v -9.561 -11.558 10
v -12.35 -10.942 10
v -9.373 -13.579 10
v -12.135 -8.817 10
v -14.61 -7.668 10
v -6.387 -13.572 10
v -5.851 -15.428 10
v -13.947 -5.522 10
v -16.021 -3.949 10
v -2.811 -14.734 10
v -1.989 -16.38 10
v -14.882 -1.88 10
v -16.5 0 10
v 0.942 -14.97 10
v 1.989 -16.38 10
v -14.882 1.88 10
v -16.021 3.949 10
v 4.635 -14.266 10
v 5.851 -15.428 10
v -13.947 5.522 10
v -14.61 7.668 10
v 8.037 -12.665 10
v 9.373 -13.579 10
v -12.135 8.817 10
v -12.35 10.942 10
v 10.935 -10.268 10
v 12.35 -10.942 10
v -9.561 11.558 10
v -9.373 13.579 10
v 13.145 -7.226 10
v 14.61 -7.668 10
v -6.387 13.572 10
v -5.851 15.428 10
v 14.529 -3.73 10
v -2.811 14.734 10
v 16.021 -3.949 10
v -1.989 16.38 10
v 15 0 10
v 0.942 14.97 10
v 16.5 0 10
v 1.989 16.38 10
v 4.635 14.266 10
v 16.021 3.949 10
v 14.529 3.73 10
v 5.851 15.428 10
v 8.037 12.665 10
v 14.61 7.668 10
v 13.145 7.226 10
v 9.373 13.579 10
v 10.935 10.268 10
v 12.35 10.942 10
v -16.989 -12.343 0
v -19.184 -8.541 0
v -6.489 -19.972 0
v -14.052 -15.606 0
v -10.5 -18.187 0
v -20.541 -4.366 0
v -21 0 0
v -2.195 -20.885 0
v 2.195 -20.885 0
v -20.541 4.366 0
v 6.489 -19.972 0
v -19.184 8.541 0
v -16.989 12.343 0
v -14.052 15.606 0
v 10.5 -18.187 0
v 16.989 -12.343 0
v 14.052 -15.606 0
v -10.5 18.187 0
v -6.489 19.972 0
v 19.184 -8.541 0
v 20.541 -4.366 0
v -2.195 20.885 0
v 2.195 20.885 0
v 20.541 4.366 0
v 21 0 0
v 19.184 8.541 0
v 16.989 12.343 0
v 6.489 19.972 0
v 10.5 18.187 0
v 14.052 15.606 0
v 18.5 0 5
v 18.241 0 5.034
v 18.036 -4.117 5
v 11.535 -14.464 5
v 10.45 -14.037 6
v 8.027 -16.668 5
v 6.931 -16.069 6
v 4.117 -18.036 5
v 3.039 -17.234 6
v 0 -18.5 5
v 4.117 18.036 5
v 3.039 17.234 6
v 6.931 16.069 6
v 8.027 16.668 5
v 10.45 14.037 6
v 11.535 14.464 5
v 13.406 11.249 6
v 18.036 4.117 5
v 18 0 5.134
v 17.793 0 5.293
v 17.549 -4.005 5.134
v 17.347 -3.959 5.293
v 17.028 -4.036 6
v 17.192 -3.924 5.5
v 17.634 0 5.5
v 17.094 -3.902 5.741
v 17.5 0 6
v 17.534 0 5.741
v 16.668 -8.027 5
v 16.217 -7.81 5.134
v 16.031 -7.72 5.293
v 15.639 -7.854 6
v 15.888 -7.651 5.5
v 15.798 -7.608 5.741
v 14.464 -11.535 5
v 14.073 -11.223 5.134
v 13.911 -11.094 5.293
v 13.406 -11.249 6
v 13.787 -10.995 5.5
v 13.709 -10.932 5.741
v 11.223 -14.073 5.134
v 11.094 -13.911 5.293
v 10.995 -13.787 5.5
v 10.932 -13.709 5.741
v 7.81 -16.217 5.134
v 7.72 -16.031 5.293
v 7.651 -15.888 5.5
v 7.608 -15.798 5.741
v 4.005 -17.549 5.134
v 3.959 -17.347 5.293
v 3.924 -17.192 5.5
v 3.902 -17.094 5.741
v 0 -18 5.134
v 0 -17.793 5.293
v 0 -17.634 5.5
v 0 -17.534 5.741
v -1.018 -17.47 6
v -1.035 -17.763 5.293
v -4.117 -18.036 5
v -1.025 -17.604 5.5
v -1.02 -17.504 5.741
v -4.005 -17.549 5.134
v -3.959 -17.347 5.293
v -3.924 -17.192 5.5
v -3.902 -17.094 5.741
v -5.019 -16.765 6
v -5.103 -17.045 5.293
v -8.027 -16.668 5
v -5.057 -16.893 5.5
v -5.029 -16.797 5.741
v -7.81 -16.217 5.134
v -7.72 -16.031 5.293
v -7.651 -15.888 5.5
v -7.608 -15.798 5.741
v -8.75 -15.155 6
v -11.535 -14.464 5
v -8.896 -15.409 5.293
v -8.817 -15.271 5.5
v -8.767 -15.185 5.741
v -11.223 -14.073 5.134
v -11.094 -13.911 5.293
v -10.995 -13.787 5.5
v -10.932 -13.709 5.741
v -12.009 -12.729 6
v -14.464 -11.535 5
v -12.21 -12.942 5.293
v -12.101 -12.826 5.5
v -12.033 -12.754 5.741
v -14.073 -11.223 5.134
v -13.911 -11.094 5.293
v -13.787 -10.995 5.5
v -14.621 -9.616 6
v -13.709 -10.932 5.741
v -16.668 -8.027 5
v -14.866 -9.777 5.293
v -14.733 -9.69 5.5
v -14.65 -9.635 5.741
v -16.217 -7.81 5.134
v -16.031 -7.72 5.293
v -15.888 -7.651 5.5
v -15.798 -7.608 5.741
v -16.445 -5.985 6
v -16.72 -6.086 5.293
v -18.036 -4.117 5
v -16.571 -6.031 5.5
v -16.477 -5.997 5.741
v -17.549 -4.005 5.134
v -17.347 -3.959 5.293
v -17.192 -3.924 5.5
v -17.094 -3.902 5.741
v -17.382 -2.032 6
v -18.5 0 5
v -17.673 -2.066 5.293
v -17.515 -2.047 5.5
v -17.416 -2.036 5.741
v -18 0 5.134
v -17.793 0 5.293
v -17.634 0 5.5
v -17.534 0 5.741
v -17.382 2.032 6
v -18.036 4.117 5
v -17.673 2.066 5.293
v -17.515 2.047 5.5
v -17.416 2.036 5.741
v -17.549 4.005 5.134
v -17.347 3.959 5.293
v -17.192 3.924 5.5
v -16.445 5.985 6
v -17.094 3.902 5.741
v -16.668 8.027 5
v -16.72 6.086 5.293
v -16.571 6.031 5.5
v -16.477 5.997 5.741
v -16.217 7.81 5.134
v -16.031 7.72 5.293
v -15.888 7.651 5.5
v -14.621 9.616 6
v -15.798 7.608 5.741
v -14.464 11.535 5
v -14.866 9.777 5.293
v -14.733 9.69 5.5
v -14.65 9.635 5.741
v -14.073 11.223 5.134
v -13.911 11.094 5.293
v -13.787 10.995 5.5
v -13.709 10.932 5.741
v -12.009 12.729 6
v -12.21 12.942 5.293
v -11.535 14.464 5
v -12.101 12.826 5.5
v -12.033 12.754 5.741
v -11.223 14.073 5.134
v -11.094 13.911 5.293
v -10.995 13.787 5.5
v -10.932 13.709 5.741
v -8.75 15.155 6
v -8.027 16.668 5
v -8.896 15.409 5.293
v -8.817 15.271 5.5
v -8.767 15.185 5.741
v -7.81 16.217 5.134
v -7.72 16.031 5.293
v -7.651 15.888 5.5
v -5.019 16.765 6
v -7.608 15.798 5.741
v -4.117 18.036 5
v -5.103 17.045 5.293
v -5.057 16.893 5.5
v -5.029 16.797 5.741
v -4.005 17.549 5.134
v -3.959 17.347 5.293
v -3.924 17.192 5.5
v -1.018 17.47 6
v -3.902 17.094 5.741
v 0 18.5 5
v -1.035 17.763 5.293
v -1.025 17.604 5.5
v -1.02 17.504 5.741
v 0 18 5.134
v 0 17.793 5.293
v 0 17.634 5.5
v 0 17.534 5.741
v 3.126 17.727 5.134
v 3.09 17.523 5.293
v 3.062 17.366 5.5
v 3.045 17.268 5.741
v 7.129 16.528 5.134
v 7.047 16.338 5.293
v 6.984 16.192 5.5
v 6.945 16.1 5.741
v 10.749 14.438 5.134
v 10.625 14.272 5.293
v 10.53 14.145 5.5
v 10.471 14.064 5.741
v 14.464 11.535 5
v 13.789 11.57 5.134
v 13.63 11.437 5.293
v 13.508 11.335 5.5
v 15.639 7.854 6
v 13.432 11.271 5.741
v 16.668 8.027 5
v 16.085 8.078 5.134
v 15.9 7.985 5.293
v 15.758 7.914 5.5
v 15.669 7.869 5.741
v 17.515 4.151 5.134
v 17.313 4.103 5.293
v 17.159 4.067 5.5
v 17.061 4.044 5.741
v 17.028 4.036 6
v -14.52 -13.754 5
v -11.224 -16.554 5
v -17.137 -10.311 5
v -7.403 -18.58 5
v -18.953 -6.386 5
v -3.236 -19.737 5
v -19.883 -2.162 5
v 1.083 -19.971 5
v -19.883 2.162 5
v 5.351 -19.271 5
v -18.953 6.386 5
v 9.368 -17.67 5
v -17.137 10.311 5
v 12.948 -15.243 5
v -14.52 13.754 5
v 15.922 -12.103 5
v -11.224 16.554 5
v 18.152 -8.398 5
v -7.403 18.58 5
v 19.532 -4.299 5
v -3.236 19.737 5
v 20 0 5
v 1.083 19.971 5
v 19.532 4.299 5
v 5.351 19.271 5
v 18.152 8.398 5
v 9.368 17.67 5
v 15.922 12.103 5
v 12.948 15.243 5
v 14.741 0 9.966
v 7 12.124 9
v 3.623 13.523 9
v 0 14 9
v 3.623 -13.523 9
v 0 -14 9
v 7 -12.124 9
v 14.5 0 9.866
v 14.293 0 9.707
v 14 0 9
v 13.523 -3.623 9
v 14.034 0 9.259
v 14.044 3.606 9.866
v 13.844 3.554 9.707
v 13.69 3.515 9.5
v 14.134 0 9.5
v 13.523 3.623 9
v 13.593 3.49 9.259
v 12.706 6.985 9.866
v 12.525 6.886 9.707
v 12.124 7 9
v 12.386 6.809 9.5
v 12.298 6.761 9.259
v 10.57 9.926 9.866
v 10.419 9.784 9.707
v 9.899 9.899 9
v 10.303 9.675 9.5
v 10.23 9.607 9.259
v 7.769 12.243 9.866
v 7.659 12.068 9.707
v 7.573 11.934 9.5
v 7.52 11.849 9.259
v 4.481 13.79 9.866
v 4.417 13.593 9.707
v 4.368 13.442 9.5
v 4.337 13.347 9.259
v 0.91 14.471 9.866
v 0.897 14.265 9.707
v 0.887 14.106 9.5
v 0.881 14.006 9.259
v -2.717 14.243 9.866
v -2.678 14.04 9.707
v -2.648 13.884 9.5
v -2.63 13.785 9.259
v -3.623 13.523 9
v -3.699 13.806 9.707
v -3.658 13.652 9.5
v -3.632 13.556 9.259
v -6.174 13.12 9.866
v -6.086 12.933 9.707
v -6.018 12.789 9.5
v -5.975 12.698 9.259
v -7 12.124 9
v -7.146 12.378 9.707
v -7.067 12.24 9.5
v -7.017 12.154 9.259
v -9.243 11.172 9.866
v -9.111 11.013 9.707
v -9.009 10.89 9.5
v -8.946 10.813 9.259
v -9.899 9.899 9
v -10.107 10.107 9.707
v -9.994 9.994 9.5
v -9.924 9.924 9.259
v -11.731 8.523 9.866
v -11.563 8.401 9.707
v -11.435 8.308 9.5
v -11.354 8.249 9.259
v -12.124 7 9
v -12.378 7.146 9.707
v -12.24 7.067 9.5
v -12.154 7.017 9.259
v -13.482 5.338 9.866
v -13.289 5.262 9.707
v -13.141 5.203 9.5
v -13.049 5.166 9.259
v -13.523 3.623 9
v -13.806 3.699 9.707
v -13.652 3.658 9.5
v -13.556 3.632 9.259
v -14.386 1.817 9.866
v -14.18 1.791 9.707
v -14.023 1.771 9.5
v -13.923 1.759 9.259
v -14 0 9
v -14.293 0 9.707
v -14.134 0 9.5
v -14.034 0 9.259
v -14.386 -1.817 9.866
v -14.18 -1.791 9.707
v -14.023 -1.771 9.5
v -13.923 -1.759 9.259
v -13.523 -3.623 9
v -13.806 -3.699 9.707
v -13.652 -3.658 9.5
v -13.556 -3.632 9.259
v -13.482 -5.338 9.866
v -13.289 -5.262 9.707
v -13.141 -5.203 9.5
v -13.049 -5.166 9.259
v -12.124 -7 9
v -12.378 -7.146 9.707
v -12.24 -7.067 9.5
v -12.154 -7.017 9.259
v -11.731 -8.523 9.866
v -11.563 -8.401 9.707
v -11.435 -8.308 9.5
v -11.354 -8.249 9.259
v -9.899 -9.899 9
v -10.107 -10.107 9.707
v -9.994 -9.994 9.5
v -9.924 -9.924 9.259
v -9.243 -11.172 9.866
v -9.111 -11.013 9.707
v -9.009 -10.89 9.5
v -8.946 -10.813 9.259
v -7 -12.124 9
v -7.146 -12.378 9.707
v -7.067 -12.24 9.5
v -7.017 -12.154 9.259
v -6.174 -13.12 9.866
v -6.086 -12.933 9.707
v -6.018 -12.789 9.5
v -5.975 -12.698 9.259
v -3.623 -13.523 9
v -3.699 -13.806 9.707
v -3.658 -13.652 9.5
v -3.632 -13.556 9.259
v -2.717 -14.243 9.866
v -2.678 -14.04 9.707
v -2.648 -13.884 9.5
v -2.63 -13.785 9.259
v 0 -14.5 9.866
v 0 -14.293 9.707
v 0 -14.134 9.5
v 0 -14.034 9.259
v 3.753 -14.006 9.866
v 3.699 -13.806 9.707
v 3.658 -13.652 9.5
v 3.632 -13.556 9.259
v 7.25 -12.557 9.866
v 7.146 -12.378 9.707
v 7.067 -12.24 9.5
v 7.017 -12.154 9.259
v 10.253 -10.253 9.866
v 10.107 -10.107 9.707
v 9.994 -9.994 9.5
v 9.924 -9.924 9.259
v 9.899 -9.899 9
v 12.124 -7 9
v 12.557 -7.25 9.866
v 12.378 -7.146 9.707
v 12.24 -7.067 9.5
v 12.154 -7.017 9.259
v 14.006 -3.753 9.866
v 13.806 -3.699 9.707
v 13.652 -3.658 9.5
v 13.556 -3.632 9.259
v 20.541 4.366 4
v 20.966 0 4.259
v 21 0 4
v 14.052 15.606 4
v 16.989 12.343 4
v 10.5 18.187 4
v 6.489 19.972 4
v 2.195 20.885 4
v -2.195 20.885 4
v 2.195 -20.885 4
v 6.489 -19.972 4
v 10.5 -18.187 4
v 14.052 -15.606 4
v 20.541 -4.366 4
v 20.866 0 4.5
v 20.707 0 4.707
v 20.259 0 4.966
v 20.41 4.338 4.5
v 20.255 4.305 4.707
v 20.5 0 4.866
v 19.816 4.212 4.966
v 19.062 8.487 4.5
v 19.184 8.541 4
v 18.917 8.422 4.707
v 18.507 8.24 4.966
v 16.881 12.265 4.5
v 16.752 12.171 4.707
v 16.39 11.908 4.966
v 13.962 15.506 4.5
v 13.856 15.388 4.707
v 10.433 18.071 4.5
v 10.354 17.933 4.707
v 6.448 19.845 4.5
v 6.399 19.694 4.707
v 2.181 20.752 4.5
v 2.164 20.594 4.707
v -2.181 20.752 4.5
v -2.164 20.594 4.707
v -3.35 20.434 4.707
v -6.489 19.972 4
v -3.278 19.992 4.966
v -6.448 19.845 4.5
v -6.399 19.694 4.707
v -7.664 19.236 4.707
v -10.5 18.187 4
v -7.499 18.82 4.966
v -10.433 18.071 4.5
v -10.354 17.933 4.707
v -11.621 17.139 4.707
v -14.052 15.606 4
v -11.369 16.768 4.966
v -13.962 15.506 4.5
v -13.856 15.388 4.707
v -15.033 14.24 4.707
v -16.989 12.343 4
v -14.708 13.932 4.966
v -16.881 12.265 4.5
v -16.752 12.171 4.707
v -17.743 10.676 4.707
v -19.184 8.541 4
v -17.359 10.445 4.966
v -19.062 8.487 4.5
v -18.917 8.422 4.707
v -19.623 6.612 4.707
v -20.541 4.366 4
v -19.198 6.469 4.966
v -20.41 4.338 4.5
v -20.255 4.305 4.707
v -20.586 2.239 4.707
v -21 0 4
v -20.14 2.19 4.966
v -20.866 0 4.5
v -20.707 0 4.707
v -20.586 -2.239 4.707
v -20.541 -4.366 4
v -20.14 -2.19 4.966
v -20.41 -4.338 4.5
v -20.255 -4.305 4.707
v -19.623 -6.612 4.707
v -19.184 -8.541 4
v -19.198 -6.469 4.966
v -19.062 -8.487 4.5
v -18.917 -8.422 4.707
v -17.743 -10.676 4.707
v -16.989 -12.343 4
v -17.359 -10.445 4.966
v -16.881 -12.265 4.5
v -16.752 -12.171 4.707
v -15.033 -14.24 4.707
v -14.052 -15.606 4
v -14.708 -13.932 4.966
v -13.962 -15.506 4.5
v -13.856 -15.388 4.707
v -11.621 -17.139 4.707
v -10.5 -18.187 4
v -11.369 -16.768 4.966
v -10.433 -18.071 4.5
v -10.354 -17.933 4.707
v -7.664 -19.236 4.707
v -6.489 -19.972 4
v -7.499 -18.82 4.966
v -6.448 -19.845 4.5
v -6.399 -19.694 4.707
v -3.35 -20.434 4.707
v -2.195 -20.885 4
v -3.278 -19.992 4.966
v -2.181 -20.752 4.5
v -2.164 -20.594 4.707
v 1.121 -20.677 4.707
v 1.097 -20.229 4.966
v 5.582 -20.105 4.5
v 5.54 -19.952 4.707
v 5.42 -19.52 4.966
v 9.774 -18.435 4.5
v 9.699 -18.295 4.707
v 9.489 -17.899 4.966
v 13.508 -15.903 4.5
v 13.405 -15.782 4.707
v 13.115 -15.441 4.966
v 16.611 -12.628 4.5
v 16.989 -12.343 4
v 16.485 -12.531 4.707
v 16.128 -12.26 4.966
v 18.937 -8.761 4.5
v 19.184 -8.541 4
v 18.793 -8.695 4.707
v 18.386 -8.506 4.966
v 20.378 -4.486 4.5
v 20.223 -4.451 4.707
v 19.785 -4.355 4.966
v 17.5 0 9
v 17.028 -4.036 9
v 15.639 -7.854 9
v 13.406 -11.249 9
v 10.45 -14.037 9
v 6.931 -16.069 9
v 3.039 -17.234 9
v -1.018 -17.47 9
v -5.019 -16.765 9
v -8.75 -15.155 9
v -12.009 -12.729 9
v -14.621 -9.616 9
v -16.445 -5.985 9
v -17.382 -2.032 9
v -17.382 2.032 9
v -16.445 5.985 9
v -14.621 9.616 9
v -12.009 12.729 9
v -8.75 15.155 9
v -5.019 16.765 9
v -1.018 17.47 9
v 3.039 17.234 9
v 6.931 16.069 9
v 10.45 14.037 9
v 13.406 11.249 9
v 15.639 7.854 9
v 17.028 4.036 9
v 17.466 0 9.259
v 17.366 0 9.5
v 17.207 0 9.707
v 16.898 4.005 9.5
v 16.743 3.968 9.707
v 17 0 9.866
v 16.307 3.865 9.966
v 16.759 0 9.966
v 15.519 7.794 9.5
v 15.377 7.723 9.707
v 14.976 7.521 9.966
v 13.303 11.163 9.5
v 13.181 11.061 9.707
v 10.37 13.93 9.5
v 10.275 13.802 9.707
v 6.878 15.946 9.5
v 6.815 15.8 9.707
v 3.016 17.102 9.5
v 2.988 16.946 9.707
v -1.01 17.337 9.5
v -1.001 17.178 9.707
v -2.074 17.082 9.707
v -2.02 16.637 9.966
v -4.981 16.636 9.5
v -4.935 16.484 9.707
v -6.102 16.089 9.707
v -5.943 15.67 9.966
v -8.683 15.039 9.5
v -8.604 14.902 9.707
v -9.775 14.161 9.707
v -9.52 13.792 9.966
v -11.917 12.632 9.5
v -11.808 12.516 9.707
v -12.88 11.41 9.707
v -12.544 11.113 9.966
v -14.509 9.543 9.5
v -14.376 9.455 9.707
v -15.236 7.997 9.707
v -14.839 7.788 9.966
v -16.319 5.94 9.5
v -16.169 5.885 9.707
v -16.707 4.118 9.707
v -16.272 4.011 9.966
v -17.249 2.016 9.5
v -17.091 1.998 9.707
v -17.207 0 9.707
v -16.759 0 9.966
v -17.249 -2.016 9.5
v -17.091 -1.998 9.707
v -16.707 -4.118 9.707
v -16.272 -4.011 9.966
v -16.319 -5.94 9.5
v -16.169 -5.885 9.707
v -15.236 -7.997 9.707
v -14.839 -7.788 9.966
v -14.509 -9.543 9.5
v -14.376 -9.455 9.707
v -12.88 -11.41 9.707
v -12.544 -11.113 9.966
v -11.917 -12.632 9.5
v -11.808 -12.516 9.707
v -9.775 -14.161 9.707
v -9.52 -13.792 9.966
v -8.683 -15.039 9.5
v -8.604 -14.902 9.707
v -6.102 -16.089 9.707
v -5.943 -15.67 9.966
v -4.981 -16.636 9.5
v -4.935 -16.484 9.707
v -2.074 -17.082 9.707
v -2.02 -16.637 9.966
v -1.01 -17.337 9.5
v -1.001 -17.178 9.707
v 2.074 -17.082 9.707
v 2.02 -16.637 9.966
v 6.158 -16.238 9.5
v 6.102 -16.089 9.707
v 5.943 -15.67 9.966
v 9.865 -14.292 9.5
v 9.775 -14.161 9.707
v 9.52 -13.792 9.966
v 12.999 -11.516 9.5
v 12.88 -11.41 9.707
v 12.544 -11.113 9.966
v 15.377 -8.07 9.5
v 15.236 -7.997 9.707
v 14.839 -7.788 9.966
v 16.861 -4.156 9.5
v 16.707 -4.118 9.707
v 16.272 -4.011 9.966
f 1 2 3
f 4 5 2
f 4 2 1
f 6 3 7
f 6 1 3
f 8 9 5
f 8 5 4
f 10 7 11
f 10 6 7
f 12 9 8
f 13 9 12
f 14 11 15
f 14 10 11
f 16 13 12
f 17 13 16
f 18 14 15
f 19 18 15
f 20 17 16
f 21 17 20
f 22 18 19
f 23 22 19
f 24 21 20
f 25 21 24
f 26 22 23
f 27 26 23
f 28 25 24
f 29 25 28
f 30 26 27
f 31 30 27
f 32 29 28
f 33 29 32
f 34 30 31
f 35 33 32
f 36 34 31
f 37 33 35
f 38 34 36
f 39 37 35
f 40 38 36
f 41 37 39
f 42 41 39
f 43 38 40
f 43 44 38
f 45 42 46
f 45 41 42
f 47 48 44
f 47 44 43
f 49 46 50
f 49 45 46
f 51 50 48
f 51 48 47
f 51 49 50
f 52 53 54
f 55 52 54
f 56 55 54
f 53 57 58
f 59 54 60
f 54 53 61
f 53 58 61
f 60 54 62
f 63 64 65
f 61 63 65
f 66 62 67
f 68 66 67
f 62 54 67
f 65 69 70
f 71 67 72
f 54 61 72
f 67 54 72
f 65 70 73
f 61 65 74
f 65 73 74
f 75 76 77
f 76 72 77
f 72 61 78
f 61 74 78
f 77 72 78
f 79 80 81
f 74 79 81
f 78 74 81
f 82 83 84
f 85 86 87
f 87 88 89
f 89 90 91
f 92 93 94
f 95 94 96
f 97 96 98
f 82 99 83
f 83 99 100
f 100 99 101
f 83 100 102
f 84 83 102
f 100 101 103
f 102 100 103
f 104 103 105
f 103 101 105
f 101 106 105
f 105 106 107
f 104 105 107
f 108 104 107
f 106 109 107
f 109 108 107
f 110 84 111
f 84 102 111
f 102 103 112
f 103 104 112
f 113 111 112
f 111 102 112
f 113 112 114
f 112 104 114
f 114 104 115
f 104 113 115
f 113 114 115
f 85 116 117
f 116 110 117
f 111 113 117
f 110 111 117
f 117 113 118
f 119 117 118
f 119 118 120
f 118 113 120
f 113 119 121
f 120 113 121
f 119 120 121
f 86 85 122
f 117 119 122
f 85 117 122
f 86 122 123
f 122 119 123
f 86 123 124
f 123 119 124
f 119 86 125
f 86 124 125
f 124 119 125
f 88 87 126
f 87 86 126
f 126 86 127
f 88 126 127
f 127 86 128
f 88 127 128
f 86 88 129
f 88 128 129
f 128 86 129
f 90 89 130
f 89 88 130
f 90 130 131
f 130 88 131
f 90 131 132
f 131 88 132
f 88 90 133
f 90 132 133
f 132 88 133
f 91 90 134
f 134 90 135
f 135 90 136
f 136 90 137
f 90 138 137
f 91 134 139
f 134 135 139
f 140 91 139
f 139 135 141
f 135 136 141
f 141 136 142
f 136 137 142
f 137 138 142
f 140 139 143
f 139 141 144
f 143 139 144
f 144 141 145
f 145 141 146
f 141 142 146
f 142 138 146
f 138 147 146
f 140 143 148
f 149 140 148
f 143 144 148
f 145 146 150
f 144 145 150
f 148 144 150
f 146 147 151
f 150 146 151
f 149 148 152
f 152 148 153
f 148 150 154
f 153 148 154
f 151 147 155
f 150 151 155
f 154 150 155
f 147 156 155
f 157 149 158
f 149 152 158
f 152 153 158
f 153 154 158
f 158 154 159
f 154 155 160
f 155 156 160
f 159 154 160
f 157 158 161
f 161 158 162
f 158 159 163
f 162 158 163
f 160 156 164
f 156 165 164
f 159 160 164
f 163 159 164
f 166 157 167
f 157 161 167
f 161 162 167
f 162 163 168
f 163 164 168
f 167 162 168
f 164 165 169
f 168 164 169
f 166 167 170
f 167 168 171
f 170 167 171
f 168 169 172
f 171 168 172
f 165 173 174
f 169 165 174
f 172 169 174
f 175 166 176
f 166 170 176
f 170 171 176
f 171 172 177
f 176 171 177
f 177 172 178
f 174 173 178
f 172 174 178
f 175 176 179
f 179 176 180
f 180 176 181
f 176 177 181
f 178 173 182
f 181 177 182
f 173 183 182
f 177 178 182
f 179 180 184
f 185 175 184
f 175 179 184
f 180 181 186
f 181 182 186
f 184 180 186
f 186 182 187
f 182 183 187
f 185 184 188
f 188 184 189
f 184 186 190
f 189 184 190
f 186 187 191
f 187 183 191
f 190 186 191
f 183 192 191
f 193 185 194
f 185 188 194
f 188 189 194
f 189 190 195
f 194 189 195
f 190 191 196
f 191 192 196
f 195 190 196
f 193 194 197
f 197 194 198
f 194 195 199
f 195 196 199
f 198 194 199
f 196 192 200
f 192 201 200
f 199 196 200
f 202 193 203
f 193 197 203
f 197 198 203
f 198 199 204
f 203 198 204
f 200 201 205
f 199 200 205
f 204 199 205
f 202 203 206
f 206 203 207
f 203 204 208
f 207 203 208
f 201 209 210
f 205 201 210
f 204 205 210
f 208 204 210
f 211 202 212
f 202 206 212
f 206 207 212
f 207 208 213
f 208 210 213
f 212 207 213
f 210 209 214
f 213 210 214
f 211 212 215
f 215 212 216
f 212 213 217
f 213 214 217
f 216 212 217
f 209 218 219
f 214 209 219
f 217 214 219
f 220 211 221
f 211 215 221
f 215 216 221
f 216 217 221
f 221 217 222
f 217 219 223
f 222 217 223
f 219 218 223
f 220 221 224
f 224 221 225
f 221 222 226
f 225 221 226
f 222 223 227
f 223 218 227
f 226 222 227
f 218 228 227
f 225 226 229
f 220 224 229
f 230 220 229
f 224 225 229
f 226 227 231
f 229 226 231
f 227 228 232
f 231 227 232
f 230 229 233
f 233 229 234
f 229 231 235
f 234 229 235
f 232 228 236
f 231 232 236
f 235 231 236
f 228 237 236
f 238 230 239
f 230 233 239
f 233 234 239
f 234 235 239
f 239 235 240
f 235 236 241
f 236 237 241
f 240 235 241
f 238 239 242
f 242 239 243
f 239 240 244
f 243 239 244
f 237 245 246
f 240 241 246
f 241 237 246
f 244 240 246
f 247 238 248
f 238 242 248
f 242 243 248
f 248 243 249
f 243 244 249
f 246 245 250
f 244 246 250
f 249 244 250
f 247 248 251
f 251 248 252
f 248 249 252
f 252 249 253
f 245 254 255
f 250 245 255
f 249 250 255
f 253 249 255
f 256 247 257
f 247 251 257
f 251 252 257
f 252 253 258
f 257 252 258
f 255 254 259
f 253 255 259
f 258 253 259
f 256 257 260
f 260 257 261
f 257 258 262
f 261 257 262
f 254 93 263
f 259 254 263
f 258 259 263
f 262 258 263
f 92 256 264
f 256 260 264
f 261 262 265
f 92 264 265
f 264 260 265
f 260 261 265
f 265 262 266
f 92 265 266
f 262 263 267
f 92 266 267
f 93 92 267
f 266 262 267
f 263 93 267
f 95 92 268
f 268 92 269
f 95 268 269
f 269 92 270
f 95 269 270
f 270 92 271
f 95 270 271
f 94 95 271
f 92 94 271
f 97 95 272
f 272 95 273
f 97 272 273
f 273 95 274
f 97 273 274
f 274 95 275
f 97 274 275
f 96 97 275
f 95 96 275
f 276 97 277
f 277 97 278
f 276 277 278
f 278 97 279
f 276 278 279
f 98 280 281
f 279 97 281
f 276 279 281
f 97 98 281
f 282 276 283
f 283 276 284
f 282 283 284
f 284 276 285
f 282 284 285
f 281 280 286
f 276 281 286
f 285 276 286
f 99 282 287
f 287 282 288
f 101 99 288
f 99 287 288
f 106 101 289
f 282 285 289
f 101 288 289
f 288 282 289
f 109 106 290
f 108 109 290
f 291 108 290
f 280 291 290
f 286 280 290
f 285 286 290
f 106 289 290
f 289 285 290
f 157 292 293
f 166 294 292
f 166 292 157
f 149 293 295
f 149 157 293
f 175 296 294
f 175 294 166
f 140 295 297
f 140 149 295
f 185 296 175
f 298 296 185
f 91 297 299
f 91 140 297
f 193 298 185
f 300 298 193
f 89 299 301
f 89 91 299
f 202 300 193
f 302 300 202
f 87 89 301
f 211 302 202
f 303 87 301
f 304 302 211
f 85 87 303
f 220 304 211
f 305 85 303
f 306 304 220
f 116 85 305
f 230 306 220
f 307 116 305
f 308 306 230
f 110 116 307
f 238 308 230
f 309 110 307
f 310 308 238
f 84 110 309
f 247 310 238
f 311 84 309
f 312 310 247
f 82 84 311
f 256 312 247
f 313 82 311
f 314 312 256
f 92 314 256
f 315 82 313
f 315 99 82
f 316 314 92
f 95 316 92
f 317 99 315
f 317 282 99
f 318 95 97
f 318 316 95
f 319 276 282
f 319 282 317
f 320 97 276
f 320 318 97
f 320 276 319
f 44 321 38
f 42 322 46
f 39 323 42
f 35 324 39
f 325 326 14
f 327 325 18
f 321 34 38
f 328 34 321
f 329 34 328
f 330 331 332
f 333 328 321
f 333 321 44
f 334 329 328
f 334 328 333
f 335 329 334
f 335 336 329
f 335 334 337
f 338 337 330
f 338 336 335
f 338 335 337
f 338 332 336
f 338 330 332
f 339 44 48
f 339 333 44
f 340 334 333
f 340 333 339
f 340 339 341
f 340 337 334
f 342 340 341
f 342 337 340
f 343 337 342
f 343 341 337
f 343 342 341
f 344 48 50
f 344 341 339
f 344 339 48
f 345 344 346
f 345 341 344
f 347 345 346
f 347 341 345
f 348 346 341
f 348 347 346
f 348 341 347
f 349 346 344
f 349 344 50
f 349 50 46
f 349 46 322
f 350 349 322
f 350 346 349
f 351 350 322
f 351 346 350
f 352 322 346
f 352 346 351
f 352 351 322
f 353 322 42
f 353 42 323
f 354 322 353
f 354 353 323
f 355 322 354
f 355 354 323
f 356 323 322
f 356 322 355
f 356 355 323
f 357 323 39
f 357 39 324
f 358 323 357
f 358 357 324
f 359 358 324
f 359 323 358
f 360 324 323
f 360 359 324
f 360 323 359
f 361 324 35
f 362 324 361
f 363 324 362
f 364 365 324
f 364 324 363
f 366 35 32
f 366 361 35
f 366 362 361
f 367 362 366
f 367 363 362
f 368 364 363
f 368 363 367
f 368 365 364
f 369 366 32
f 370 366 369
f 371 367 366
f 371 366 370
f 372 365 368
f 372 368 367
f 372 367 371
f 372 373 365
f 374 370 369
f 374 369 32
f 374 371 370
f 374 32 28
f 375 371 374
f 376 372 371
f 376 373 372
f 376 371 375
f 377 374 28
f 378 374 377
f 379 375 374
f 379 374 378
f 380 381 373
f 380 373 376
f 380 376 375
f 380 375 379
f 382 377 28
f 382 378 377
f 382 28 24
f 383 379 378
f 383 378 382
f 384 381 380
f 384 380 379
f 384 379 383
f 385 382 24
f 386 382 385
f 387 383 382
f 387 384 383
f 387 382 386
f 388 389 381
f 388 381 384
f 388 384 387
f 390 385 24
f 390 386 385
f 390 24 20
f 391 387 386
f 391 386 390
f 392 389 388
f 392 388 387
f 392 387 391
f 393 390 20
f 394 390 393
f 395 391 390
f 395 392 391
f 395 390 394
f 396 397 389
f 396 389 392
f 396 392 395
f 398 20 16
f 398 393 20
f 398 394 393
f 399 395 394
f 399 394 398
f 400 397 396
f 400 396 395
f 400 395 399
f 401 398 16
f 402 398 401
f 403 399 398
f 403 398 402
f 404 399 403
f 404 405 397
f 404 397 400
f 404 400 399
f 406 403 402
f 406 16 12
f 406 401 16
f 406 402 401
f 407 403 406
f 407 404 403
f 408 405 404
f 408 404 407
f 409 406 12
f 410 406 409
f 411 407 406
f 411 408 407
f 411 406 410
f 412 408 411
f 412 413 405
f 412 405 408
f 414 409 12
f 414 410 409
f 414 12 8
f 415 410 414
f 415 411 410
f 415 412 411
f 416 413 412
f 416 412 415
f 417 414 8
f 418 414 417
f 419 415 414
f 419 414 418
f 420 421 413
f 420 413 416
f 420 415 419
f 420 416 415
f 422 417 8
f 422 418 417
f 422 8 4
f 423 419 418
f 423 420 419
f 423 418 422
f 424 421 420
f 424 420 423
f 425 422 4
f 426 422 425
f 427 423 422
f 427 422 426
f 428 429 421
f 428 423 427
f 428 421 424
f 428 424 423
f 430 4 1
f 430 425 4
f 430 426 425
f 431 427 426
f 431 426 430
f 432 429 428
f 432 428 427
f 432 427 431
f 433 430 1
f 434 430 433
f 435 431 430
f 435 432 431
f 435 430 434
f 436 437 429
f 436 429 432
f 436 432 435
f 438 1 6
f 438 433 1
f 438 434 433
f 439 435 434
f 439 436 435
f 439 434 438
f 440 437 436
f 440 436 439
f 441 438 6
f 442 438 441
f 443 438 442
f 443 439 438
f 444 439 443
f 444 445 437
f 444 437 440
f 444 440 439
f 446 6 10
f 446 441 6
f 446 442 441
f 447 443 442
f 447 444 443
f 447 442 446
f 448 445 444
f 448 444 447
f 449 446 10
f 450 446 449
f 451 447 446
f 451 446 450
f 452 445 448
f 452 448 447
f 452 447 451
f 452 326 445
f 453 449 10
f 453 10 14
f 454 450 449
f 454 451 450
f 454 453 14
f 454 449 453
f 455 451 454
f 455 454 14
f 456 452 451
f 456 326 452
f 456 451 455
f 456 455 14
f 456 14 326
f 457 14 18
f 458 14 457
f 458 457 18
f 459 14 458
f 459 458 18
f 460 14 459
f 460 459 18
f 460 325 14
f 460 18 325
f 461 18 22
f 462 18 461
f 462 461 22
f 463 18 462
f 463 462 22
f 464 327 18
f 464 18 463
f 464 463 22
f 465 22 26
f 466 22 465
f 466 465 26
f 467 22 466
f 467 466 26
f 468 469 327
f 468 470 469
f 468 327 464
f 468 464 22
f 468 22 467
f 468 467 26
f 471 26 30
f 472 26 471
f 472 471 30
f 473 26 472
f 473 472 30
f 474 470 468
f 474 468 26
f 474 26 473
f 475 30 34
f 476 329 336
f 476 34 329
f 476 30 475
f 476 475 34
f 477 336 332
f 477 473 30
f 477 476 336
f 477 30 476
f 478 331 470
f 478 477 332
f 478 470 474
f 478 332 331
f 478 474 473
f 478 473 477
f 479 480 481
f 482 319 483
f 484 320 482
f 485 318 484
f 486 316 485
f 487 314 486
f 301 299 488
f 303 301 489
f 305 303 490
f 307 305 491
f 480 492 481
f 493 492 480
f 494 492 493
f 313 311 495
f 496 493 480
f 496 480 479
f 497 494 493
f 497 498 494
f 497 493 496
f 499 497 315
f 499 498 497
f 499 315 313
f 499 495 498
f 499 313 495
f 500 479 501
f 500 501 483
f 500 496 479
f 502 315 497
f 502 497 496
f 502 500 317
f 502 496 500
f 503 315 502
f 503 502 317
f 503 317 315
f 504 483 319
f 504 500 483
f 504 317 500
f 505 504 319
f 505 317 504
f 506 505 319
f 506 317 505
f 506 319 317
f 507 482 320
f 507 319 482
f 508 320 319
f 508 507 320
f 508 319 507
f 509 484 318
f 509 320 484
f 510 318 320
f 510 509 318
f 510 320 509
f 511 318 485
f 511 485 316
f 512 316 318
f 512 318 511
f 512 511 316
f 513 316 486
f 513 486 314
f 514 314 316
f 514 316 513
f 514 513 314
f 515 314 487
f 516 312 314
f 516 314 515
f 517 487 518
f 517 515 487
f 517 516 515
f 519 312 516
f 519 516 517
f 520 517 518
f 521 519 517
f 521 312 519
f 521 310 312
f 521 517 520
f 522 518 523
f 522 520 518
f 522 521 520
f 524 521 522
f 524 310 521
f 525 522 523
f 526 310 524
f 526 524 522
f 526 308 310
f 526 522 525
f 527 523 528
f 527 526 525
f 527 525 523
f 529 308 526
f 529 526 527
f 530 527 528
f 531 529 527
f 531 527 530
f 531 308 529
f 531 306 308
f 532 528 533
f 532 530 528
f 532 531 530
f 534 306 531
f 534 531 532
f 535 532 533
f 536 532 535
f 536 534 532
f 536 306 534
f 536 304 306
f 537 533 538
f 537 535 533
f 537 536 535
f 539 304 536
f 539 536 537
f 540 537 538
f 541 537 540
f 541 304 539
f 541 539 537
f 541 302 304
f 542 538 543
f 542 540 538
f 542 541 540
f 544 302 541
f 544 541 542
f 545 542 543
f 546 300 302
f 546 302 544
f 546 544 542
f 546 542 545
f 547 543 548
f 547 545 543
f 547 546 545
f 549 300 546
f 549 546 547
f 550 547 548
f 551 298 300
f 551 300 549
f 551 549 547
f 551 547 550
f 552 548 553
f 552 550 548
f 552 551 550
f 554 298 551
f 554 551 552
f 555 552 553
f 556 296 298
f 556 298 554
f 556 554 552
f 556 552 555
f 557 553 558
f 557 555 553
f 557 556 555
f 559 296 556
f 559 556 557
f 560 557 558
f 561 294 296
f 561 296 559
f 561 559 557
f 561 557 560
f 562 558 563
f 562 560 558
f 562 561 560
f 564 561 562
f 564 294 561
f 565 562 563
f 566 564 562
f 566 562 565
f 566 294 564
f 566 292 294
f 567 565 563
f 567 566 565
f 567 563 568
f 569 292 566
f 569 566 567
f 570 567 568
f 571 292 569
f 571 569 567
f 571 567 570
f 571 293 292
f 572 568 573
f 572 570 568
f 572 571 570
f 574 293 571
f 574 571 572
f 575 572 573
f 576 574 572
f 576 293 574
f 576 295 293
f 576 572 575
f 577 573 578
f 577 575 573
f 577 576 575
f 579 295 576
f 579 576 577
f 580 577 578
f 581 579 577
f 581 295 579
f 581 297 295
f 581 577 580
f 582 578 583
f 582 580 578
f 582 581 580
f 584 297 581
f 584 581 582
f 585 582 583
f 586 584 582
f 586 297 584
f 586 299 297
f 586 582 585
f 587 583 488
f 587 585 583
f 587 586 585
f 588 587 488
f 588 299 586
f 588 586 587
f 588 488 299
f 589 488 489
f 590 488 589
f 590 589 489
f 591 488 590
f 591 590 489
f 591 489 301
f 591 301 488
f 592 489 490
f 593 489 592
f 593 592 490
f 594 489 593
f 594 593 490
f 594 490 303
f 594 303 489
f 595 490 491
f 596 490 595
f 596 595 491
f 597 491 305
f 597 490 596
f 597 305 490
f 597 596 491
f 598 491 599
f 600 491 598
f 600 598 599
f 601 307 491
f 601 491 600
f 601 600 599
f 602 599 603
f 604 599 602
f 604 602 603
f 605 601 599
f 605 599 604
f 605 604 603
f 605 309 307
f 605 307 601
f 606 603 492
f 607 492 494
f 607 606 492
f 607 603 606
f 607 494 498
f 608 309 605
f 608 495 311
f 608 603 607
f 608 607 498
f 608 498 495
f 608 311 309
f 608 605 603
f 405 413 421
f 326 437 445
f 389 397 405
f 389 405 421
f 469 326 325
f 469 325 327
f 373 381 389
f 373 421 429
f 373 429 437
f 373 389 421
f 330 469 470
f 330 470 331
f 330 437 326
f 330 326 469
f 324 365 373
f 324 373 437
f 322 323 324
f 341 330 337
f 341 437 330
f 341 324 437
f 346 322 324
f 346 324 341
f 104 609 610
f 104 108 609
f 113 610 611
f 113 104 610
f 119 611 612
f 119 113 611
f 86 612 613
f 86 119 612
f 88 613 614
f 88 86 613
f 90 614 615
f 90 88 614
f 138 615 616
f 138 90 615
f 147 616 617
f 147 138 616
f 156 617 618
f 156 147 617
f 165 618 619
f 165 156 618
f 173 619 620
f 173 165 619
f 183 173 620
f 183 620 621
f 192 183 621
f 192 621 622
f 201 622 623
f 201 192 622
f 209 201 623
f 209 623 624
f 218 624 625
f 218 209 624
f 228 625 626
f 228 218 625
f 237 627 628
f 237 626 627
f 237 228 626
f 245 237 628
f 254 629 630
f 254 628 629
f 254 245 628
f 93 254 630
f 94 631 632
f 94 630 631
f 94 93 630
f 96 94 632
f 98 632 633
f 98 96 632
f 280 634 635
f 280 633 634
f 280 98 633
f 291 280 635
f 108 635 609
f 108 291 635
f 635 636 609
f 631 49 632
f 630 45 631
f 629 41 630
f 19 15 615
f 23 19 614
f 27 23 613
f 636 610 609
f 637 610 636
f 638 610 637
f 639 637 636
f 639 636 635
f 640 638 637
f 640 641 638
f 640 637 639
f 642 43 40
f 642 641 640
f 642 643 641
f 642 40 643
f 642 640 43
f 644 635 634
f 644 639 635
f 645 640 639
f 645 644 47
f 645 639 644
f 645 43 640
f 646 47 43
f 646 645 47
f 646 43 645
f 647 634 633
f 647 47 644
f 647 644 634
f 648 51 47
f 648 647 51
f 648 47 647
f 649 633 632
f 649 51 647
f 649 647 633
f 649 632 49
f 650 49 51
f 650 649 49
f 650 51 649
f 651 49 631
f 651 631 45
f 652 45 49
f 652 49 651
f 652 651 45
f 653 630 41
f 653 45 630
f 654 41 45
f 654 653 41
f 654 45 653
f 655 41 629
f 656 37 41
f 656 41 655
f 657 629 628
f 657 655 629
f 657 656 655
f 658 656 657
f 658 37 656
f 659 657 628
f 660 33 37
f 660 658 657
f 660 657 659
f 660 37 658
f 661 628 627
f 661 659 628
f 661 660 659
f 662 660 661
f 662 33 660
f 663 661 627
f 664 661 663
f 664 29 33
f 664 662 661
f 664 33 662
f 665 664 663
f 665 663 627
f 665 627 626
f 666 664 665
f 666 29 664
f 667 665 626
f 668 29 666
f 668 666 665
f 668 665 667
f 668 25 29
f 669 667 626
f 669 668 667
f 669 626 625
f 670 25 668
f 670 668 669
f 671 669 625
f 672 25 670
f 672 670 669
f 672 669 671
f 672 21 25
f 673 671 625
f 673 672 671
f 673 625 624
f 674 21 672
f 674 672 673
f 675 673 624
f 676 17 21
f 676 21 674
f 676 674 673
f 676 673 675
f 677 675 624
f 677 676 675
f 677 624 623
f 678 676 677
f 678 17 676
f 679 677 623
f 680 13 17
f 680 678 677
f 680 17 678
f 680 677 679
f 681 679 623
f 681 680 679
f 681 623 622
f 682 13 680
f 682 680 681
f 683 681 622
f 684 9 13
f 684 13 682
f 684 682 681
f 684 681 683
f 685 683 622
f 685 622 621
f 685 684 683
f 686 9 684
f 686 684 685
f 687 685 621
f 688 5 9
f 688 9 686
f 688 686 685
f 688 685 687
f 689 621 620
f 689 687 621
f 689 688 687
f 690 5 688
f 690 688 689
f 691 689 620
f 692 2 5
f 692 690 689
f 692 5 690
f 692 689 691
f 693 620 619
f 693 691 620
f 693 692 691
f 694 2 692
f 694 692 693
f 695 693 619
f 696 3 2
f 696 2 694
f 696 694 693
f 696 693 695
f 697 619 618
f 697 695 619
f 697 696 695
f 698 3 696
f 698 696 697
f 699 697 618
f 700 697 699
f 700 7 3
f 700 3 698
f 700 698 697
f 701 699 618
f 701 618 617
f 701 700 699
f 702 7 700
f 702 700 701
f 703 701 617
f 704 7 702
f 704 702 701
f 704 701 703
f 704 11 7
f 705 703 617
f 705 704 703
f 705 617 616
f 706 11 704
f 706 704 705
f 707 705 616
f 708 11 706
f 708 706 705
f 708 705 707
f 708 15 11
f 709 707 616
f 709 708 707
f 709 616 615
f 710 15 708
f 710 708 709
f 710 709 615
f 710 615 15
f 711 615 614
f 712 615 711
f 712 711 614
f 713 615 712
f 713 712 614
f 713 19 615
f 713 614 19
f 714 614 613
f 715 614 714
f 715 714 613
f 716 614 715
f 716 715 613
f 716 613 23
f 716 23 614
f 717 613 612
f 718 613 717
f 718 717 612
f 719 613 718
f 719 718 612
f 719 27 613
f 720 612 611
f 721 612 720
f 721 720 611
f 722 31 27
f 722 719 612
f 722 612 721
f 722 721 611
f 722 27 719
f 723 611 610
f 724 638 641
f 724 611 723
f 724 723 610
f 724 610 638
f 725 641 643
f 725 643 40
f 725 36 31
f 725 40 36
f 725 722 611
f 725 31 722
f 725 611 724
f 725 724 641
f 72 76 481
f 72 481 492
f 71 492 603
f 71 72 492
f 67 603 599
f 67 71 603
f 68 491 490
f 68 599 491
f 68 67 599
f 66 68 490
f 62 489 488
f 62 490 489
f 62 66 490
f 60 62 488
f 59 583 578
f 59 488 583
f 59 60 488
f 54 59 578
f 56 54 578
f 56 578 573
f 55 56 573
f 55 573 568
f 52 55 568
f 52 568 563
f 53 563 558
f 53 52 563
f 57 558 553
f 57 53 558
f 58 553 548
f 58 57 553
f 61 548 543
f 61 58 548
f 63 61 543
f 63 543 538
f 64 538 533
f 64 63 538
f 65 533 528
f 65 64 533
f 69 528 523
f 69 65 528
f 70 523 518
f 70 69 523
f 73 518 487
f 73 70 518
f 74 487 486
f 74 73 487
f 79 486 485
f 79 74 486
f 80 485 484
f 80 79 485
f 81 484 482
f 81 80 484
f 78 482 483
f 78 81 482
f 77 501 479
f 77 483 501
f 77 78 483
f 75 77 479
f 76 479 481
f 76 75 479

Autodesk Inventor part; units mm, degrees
ref_plane "YZ Plane" through (0, 0, 0) normal (1, 0, 0) x (0, 1, 0)
ref_plane "XZ Plane" through (0, 0, 0) normal (0, 1, 0) x (-1, 0, 0)
ref_plane "XY Plane" through (0, 0, 0) normal (0, 0, 1) x (1, 0, 0)
sketch "スケッチ1" plane through (0, 0, 0) normal (0, 0, 1) x (1, 0, 0)
  circle A0 centre (0, 0) radius 21
  dimension "d0" = 42
extrude "押し出し1" add sketch "スケッチ1" along normal blind 5
sketch "スケッチ2" plane through (0, 0, 5) normal (0, 0, 1) x (1, 0, 0)
  circle A0 centre (0, 0) radius 14
  circle A1 centre (0, 0) radius 17.5
  circle A2 centre (0, 0) radius 21 projected
  dimension "d3" = 28
  dimension "d8" = 7
  dimension "d9" = 3.5
extrude "押し出し3" add sketch "スケッチ2" along normal blind 5 contours A1
fillet "フィレット1" radius 1 4 edges at (-14, 0, 10) (-17.5, 0, 10) (-17.5, 0, 5) (-21, 0, 5)
extrude "押し出し4" add sketch "スケッチ2" along normal blind 4 contours A0
equation "\"d9\" = 0.5 * d8"
properties part number "inkpad"
